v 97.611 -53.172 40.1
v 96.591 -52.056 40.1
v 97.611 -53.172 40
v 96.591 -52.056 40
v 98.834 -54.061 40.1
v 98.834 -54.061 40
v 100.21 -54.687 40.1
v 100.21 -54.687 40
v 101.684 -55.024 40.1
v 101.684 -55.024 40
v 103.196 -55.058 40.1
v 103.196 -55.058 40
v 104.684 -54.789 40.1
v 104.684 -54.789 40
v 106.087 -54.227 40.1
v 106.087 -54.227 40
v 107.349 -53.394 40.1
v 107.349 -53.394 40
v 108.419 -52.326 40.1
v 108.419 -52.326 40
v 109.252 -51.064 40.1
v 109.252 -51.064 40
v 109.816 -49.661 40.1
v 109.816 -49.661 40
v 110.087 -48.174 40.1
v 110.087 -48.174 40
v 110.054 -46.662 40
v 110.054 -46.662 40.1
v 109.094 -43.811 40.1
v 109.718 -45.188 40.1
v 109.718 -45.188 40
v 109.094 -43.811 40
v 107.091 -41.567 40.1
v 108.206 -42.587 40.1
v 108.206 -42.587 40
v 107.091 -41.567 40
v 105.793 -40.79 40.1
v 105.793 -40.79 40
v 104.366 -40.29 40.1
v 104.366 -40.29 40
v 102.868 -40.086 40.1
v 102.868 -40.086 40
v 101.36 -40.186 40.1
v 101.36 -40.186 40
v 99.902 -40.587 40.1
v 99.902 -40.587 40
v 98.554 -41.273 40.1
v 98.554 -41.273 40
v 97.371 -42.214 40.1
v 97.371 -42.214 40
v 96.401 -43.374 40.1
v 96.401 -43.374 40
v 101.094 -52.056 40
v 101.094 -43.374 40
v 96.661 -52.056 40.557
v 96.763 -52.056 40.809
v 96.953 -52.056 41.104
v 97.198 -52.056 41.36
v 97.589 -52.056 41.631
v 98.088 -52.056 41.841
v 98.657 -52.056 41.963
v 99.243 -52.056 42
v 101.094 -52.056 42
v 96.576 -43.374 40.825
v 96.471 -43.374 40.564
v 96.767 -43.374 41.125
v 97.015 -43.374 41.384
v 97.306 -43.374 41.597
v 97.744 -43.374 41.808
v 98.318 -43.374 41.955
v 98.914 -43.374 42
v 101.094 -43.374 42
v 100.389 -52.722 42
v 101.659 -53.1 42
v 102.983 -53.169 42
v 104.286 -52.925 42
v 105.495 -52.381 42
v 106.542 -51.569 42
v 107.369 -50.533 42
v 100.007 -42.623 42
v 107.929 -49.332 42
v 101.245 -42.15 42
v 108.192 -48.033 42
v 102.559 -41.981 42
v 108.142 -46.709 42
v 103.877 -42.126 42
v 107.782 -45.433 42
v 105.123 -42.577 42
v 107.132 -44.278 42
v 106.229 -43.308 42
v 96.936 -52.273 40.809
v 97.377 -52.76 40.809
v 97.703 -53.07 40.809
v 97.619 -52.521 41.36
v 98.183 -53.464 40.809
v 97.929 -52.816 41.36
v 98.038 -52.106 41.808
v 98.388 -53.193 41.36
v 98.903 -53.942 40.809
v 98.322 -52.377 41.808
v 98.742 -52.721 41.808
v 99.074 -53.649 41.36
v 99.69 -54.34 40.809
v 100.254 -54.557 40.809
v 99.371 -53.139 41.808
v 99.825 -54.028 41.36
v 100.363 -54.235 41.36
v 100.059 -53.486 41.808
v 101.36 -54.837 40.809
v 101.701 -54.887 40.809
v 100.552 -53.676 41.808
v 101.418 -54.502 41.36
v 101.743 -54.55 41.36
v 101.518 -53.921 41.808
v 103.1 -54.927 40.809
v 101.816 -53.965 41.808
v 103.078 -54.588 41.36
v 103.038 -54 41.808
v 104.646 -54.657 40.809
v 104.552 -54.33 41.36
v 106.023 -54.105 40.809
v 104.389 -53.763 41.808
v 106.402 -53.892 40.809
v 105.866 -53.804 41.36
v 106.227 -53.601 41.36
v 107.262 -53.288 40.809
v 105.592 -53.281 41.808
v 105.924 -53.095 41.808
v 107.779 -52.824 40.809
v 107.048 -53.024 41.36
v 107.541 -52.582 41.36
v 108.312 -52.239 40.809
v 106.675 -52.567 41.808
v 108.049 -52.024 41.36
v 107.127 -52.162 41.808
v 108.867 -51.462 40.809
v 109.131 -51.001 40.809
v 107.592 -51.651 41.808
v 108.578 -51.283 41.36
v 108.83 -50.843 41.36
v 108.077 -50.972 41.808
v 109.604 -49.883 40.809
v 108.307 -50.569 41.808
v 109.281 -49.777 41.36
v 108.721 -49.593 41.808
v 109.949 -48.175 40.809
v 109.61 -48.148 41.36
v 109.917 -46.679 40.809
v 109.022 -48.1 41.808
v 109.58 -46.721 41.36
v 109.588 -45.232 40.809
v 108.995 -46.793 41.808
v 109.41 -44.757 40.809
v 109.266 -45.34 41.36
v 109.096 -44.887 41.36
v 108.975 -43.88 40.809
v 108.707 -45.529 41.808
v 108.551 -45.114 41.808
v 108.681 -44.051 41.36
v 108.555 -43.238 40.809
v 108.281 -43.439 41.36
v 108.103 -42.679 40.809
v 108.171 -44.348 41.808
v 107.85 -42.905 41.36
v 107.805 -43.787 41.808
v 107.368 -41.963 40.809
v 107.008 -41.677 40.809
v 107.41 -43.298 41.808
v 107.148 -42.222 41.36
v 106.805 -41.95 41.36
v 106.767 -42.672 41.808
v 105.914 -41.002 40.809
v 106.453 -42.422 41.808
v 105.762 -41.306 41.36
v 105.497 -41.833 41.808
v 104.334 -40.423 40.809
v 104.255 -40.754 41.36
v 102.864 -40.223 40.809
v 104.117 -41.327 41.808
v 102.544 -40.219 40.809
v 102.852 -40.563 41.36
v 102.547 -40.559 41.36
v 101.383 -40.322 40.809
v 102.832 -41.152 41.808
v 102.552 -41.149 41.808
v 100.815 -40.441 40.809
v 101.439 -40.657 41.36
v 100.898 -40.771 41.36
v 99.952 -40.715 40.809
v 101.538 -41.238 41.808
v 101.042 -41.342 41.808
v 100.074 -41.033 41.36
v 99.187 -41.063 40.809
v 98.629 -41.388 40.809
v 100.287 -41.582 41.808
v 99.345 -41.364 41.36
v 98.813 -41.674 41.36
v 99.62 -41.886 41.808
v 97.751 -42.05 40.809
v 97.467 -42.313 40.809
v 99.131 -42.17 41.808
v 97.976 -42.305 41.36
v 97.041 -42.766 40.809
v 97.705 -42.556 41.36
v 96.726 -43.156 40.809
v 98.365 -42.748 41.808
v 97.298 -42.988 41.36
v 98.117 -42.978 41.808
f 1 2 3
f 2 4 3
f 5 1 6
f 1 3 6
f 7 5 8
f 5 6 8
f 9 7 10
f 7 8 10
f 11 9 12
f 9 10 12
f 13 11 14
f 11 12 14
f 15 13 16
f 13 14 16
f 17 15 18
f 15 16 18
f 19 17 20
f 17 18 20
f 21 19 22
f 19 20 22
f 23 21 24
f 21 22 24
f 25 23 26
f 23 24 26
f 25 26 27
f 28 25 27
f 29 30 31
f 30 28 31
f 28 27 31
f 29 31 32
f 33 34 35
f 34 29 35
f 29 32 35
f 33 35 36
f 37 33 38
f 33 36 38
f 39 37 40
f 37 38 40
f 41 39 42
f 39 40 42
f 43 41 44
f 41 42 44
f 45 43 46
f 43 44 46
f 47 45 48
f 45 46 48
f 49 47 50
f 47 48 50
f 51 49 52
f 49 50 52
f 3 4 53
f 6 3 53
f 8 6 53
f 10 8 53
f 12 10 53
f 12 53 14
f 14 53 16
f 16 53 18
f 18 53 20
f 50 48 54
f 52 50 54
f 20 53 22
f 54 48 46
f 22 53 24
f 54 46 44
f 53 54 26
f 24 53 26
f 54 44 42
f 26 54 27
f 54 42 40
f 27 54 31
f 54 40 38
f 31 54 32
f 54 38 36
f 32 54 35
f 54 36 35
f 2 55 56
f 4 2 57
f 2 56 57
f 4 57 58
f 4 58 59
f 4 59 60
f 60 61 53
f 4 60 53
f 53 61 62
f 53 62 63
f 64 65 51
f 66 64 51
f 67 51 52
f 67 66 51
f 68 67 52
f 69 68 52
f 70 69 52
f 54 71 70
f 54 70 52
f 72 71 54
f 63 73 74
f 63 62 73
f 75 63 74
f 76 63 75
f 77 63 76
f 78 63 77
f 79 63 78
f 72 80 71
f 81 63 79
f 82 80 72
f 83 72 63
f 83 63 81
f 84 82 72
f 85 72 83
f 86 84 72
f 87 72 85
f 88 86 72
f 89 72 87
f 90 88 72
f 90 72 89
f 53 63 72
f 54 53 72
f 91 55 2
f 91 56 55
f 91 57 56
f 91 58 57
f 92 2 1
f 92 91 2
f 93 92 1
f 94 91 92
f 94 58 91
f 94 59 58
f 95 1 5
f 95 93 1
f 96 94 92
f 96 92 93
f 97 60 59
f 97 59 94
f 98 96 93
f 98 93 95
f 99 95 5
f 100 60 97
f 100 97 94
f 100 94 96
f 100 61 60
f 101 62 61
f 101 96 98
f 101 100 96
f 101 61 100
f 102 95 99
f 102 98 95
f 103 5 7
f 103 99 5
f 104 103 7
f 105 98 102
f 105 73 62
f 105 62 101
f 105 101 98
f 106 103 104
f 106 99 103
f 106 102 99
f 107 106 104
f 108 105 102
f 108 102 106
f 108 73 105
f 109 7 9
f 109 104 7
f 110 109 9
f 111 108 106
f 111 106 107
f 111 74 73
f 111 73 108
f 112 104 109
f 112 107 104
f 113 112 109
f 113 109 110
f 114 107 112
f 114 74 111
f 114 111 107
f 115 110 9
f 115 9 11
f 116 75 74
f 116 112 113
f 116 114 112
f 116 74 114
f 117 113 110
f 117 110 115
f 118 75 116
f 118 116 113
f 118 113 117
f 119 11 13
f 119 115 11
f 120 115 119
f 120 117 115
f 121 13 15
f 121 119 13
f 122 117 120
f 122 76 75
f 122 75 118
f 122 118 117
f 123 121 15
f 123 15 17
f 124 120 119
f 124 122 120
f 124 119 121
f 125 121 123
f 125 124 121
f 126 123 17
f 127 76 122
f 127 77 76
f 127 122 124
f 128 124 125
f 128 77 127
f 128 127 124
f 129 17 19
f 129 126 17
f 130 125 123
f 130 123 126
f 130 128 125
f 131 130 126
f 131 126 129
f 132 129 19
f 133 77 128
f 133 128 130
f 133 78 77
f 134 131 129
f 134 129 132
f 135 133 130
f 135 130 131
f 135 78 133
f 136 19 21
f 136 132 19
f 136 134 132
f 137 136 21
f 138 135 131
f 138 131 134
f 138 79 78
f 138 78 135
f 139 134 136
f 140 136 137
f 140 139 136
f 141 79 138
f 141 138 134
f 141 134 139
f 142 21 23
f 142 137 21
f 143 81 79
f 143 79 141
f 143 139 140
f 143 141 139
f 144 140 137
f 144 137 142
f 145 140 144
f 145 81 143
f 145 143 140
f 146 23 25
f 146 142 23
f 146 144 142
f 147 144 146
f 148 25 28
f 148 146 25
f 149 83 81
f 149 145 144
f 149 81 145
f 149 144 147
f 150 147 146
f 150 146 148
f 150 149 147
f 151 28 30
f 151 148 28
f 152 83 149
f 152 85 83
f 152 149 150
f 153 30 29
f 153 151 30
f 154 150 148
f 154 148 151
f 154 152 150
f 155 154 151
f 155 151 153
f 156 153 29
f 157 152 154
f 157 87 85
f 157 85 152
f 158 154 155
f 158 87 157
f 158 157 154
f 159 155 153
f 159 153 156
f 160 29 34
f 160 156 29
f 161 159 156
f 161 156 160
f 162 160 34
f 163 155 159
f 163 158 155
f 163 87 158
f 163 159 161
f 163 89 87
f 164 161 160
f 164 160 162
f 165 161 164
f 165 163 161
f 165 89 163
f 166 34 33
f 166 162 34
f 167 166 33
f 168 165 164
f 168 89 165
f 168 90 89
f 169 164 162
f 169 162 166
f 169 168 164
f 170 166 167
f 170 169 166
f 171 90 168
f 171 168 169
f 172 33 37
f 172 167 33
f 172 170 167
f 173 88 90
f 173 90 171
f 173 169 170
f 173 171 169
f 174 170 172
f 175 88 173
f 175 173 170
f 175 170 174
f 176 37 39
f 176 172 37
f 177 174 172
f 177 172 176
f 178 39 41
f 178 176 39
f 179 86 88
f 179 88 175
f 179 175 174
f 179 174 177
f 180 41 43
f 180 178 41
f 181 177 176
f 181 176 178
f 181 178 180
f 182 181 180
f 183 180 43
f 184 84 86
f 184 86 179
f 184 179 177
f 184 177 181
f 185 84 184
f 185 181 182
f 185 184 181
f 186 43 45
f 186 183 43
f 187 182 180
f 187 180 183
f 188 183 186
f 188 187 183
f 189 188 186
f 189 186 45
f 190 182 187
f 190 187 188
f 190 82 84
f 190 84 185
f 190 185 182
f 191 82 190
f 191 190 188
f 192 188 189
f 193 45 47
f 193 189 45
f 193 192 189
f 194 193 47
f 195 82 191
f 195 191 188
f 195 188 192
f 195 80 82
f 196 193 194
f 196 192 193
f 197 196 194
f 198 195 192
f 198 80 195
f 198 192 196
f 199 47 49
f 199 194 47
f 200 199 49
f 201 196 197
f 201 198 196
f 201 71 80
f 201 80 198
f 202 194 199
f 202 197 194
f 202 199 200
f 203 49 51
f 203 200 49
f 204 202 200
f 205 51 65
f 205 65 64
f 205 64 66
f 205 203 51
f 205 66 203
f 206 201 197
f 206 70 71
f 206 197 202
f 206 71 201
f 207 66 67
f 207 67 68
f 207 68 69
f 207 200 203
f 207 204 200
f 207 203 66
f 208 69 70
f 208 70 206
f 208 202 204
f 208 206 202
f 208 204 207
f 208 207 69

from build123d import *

# Parameters (mm, degrees)
SKETCH037_R     = 7.5
PAD014_DEPTH    = 2
FILLET_R        = 1.9
SKETCH038_W     = 7.549545
SKETCH038_H     = 8.681977
POCKET016_DEPTH = 5


with BuildPart() as part:
    # Sketch037 → Pad014 (new body)
    with BuildSketch(Plane.XY):
        with Locations((102.610229, -47.581253)):
            Circle(SKETCH037_R)
    extrude(amount=PAD014_DEPTH)

    # Fillet
    fillet_edges = [part.edges().sort_by_distance(p)[0] for p in [
        (95.110229, -47.581253, 2),
    ]]
    fillet(fillet_edges, radius=FILLET_R)

    # Sketch038 (on Face4 of Fillet) → Pocket016 (cut)
    with BuildSketch(Plane.XY.offset(2)):
        with Locations((97.318771, -47.714951)):
            Rectangle(SKETCH038_W, SKETCH038_H)
    extrude(amount=-POCKET016_DEPTH, mode=Mode.SUBTRACT)


with BuildPart() as part_1:
    # Body006 placement: moved
    add(part.part.moved(Location((0, 0, 40))))


solid = part_1.part
